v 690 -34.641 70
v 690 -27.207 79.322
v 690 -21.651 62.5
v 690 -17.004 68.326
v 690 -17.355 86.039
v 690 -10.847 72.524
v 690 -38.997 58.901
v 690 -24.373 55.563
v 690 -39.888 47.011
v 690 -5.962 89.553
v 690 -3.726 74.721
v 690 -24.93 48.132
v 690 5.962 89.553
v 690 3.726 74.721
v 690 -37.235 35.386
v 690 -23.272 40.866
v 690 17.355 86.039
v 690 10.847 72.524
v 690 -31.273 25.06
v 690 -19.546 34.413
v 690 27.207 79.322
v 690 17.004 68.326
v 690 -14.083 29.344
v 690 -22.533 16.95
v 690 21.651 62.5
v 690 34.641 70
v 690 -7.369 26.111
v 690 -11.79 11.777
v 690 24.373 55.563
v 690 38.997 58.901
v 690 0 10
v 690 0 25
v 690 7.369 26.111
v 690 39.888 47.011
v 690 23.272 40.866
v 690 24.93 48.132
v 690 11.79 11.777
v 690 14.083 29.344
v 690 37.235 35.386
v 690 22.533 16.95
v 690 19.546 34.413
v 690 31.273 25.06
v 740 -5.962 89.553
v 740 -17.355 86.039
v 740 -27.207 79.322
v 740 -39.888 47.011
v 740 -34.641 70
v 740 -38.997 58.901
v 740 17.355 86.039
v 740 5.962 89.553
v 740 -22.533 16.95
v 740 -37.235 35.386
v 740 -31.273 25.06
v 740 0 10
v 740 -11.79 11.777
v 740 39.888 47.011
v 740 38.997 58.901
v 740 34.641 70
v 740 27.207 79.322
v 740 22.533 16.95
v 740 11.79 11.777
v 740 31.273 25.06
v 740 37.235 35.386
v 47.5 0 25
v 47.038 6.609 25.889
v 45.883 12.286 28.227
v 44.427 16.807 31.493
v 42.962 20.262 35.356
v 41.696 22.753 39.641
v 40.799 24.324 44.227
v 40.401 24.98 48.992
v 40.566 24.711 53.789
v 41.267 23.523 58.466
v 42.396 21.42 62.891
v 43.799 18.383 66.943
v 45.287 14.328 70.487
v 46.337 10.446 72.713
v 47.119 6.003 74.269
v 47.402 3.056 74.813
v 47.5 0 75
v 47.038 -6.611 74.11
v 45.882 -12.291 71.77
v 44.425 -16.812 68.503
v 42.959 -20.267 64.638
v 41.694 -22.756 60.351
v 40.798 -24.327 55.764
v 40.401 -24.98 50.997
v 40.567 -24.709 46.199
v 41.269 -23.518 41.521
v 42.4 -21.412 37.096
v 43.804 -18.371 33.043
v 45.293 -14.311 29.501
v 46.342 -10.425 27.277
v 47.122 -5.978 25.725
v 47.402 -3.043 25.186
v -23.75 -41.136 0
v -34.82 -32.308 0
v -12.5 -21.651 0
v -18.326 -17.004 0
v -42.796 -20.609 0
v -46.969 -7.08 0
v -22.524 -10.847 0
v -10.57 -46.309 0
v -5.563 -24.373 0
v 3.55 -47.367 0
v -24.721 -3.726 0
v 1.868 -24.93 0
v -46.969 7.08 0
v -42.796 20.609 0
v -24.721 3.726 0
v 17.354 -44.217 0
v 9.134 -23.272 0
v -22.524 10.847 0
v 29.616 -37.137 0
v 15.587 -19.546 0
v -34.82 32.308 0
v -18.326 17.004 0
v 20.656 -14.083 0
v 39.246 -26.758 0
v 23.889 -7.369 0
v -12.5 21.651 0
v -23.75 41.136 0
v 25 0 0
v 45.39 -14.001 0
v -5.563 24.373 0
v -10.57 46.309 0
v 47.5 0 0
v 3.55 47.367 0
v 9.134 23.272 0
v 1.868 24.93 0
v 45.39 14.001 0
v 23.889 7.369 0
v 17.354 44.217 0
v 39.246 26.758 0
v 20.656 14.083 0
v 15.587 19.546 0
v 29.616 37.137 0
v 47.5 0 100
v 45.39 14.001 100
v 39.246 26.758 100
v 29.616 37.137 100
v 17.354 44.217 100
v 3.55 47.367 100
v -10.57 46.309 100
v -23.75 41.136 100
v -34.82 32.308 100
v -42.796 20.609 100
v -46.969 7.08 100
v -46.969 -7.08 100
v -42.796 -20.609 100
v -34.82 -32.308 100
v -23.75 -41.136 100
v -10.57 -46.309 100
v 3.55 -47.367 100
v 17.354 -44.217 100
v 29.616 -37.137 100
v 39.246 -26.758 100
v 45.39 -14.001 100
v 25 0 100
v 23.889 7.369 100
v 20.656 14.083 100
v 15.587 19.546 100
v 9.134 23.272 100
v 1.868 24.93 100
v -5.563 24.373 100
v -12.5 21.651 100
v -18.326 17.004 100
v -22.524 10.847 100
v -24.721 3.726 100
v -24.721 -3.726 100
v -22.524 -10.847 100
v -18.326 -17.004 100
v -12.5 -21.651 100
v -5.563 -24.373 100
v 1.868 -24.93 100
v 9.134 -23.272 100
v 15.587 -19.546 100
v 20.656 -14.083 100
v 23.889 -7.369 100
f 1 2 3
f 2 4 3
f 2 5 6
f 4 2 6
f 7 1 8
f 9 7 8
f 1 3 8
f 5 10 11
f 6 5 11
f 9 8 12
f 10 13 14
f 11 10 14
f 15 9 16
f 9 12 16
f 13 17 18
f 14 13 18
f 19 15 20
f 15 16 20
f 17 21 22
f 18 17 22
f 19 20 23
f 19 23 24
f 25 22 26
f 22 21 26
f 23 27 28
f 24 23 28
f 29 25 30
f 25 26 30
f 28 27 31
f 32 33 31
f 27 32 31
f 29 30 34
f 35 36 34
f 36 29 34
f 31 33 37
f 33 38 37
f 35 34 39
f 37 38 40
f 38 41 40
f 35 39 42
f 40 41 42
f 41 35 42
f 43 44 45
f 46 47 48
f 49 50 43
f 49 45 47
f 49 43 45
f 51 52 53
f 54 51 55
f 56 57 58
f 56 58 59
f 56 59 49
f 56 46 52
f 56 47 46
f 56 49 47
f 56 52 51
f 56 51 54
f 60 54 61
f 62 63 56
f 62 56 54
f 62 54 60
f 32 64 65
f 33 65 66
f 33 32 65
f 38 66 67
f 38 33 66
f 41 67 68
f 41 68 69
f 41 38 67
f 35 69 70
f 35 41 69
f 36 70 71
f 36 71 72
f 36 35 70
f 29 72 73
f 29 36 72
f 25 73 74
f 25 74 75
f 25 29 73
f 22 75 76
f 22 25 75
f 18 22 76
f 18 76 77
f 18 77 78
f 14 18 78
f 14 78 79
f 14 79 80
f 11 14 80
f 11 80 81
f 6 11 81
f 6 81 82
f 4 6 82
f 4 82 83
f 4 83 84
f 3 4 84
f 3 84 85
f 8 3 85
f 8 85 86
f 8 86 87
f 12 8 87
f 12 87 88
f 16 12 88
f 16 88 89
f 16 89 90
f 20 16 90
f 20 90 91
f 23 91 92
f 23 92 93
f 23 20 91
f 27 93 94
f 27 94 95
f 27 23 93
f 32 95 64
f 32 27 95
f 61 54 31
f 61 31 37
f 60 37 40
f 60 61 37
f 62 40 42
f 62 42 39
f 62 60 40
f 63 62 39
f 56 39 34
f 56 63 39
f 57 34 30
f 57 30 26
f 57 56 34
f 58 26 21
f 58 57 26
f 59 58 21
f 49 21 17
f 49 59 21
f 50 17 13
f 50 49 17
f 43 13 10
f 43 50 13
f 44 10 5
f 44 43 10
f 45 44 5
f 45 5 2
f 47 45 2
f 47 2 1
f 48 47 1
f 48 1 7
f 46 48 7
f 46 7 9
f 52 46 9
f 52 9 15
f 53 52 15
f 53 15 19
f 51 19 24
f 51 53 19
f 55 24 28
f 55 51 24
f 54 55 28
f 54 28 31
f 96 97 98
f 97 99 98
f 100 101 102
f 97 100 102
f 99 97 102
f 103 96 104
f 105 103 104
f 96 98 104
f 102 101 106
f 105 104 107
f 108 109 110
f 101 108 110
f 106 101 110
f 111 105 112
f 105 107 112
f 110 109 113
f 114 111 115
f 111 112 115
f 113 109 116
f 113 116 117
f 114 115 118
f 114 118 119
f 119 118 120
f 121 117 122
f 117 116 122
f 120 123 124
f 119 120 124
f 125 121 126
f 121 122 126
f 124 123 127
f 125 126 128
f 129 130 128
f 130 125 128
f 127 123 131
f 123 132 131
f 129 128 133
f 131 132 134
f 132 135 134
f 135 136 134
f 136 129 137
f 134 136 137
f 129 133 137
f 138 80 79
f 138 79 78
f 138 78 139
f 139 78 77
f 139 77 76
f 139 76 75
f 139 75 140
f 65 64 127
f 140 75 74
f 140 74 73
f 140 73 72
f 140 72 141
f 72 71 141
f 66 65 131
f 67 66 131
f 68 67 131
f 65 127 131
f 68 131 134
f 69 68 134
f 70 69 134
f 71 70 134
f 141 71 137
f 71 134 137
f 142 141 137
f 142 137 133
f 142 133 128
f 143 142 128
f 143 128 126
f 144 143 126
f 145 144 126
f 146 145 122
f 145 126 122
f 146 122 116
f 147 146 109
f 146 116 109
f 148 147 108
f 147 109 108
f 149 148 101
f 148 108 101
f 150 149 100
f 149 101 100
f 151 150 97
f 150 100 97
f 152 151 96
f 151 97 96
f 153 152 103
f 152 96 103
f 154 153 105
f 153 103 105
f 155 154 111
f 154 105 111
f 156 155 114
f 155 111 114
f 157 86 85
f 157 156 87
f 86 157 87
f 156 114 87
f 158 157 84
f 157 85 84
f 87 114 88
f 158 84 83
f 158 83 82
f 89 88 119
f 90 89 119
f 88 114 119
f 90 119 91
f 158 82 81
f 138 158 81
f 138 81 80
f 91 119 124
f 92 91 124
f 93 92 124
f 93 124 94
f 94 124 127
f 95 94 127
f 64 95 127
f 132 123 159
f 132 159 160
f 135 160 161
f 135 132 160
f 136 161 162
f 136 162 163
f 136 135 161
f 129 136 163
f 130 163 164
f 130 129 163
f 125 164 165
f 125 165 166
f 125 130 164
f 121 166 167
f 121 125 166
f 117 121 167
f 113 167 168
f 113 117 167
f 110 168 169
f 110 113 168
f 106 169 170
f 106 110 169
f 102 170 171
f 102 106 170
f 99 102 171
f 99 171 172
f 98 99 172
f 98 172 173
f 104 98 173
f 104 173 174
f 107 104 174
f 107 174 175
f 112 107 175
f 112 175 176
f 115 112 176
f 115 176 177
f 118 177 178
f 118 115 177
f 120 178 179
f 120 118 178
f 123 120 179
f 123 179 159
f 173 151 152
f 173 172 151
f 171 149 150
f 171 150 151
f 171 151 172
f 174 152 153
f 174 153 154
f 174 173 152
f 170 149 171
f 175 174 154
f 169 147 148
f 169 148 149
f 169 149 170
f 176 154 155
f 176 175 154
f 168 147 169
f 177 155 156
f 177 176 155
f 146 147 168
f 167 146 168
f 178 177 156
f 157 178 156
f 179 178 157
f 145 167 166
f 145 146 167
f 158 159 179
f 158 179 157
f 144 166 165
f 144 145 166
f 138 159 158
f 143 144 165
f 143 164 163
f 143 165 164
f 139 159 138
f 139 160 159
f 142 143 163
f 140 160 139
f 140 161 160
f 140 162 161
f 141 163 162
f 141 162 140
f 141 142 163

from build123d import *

# Parameters (mm, degrees)
SKETCH1_R                = 47.5
SKETCH1_R_2              = 25
BOSS_EXTRUDE1_DEPTH      = 100
BOSS_EXTRUDE2_REACH      = 797.244
BOSS_EXTRUDE2_END_RADIUS = 47.5
SKETCH2_R                = 25
SKETCH3_R                = 40
BOSS_EXTRUDE3_DEPTH      = 50


with BuildPart() as part:
    # Sketch1 → Boss-Extrude1 (new body)
    with BuildSketch(Plane.XY):
        Circle(SKETCH1_R)
        Circle(SKETCH1_R_2, mode=Mode.SUBTRACT)
    extrude(amount=BOSS_EXTRUDE1_DEPTH)

    # Boss-Extrude2: up to this cylinder (the profile starts outside it)
    boss_extrude2_end = Plane(origin=(0, 0, 50), z_dir=(0, 0, -1)) * Cylinder(BOSS_EXTRUDE2_END_RADIUS, 1690.488, mode=Mode.PRIVATE)
    # Sketch2 → Boss-Extrude2 (add, up to the surface)
    with BuildSketch(Plane(origin=(740, 0, 0), x_dir=(0, 0, -1), z_dir=(1, 0, 0)), mode=Mode.PRIVATE) as boss_extrude2_sk1:
        with Locations((-50, 0)):
            Circle(SKETCH2_R)
    boss_extrude2_tool1 = extrude(boss_extrude2_sk1.sketch, amount=-BOSS_EXTRUDE2_REACH, mode=Mode.PRIVATE) - boss_extrude2_end
    add(boss_extrude2_tool1.solids().sort_by_distance((740, 0, 50))[0])

    # Sketch3 → Boss-Extrude3 (add)
    with BuildSketch(Plane(origin=(740, 0, 0), x_dir=(0, 0, -1), z_dir=(1, 0, 0))):
        with Locations((-50, 0)):
            Circle(SKETCH3_R)
    extrude(amount=-BOSS_EXTRUDE3_DEPTH)


solid = part.part
